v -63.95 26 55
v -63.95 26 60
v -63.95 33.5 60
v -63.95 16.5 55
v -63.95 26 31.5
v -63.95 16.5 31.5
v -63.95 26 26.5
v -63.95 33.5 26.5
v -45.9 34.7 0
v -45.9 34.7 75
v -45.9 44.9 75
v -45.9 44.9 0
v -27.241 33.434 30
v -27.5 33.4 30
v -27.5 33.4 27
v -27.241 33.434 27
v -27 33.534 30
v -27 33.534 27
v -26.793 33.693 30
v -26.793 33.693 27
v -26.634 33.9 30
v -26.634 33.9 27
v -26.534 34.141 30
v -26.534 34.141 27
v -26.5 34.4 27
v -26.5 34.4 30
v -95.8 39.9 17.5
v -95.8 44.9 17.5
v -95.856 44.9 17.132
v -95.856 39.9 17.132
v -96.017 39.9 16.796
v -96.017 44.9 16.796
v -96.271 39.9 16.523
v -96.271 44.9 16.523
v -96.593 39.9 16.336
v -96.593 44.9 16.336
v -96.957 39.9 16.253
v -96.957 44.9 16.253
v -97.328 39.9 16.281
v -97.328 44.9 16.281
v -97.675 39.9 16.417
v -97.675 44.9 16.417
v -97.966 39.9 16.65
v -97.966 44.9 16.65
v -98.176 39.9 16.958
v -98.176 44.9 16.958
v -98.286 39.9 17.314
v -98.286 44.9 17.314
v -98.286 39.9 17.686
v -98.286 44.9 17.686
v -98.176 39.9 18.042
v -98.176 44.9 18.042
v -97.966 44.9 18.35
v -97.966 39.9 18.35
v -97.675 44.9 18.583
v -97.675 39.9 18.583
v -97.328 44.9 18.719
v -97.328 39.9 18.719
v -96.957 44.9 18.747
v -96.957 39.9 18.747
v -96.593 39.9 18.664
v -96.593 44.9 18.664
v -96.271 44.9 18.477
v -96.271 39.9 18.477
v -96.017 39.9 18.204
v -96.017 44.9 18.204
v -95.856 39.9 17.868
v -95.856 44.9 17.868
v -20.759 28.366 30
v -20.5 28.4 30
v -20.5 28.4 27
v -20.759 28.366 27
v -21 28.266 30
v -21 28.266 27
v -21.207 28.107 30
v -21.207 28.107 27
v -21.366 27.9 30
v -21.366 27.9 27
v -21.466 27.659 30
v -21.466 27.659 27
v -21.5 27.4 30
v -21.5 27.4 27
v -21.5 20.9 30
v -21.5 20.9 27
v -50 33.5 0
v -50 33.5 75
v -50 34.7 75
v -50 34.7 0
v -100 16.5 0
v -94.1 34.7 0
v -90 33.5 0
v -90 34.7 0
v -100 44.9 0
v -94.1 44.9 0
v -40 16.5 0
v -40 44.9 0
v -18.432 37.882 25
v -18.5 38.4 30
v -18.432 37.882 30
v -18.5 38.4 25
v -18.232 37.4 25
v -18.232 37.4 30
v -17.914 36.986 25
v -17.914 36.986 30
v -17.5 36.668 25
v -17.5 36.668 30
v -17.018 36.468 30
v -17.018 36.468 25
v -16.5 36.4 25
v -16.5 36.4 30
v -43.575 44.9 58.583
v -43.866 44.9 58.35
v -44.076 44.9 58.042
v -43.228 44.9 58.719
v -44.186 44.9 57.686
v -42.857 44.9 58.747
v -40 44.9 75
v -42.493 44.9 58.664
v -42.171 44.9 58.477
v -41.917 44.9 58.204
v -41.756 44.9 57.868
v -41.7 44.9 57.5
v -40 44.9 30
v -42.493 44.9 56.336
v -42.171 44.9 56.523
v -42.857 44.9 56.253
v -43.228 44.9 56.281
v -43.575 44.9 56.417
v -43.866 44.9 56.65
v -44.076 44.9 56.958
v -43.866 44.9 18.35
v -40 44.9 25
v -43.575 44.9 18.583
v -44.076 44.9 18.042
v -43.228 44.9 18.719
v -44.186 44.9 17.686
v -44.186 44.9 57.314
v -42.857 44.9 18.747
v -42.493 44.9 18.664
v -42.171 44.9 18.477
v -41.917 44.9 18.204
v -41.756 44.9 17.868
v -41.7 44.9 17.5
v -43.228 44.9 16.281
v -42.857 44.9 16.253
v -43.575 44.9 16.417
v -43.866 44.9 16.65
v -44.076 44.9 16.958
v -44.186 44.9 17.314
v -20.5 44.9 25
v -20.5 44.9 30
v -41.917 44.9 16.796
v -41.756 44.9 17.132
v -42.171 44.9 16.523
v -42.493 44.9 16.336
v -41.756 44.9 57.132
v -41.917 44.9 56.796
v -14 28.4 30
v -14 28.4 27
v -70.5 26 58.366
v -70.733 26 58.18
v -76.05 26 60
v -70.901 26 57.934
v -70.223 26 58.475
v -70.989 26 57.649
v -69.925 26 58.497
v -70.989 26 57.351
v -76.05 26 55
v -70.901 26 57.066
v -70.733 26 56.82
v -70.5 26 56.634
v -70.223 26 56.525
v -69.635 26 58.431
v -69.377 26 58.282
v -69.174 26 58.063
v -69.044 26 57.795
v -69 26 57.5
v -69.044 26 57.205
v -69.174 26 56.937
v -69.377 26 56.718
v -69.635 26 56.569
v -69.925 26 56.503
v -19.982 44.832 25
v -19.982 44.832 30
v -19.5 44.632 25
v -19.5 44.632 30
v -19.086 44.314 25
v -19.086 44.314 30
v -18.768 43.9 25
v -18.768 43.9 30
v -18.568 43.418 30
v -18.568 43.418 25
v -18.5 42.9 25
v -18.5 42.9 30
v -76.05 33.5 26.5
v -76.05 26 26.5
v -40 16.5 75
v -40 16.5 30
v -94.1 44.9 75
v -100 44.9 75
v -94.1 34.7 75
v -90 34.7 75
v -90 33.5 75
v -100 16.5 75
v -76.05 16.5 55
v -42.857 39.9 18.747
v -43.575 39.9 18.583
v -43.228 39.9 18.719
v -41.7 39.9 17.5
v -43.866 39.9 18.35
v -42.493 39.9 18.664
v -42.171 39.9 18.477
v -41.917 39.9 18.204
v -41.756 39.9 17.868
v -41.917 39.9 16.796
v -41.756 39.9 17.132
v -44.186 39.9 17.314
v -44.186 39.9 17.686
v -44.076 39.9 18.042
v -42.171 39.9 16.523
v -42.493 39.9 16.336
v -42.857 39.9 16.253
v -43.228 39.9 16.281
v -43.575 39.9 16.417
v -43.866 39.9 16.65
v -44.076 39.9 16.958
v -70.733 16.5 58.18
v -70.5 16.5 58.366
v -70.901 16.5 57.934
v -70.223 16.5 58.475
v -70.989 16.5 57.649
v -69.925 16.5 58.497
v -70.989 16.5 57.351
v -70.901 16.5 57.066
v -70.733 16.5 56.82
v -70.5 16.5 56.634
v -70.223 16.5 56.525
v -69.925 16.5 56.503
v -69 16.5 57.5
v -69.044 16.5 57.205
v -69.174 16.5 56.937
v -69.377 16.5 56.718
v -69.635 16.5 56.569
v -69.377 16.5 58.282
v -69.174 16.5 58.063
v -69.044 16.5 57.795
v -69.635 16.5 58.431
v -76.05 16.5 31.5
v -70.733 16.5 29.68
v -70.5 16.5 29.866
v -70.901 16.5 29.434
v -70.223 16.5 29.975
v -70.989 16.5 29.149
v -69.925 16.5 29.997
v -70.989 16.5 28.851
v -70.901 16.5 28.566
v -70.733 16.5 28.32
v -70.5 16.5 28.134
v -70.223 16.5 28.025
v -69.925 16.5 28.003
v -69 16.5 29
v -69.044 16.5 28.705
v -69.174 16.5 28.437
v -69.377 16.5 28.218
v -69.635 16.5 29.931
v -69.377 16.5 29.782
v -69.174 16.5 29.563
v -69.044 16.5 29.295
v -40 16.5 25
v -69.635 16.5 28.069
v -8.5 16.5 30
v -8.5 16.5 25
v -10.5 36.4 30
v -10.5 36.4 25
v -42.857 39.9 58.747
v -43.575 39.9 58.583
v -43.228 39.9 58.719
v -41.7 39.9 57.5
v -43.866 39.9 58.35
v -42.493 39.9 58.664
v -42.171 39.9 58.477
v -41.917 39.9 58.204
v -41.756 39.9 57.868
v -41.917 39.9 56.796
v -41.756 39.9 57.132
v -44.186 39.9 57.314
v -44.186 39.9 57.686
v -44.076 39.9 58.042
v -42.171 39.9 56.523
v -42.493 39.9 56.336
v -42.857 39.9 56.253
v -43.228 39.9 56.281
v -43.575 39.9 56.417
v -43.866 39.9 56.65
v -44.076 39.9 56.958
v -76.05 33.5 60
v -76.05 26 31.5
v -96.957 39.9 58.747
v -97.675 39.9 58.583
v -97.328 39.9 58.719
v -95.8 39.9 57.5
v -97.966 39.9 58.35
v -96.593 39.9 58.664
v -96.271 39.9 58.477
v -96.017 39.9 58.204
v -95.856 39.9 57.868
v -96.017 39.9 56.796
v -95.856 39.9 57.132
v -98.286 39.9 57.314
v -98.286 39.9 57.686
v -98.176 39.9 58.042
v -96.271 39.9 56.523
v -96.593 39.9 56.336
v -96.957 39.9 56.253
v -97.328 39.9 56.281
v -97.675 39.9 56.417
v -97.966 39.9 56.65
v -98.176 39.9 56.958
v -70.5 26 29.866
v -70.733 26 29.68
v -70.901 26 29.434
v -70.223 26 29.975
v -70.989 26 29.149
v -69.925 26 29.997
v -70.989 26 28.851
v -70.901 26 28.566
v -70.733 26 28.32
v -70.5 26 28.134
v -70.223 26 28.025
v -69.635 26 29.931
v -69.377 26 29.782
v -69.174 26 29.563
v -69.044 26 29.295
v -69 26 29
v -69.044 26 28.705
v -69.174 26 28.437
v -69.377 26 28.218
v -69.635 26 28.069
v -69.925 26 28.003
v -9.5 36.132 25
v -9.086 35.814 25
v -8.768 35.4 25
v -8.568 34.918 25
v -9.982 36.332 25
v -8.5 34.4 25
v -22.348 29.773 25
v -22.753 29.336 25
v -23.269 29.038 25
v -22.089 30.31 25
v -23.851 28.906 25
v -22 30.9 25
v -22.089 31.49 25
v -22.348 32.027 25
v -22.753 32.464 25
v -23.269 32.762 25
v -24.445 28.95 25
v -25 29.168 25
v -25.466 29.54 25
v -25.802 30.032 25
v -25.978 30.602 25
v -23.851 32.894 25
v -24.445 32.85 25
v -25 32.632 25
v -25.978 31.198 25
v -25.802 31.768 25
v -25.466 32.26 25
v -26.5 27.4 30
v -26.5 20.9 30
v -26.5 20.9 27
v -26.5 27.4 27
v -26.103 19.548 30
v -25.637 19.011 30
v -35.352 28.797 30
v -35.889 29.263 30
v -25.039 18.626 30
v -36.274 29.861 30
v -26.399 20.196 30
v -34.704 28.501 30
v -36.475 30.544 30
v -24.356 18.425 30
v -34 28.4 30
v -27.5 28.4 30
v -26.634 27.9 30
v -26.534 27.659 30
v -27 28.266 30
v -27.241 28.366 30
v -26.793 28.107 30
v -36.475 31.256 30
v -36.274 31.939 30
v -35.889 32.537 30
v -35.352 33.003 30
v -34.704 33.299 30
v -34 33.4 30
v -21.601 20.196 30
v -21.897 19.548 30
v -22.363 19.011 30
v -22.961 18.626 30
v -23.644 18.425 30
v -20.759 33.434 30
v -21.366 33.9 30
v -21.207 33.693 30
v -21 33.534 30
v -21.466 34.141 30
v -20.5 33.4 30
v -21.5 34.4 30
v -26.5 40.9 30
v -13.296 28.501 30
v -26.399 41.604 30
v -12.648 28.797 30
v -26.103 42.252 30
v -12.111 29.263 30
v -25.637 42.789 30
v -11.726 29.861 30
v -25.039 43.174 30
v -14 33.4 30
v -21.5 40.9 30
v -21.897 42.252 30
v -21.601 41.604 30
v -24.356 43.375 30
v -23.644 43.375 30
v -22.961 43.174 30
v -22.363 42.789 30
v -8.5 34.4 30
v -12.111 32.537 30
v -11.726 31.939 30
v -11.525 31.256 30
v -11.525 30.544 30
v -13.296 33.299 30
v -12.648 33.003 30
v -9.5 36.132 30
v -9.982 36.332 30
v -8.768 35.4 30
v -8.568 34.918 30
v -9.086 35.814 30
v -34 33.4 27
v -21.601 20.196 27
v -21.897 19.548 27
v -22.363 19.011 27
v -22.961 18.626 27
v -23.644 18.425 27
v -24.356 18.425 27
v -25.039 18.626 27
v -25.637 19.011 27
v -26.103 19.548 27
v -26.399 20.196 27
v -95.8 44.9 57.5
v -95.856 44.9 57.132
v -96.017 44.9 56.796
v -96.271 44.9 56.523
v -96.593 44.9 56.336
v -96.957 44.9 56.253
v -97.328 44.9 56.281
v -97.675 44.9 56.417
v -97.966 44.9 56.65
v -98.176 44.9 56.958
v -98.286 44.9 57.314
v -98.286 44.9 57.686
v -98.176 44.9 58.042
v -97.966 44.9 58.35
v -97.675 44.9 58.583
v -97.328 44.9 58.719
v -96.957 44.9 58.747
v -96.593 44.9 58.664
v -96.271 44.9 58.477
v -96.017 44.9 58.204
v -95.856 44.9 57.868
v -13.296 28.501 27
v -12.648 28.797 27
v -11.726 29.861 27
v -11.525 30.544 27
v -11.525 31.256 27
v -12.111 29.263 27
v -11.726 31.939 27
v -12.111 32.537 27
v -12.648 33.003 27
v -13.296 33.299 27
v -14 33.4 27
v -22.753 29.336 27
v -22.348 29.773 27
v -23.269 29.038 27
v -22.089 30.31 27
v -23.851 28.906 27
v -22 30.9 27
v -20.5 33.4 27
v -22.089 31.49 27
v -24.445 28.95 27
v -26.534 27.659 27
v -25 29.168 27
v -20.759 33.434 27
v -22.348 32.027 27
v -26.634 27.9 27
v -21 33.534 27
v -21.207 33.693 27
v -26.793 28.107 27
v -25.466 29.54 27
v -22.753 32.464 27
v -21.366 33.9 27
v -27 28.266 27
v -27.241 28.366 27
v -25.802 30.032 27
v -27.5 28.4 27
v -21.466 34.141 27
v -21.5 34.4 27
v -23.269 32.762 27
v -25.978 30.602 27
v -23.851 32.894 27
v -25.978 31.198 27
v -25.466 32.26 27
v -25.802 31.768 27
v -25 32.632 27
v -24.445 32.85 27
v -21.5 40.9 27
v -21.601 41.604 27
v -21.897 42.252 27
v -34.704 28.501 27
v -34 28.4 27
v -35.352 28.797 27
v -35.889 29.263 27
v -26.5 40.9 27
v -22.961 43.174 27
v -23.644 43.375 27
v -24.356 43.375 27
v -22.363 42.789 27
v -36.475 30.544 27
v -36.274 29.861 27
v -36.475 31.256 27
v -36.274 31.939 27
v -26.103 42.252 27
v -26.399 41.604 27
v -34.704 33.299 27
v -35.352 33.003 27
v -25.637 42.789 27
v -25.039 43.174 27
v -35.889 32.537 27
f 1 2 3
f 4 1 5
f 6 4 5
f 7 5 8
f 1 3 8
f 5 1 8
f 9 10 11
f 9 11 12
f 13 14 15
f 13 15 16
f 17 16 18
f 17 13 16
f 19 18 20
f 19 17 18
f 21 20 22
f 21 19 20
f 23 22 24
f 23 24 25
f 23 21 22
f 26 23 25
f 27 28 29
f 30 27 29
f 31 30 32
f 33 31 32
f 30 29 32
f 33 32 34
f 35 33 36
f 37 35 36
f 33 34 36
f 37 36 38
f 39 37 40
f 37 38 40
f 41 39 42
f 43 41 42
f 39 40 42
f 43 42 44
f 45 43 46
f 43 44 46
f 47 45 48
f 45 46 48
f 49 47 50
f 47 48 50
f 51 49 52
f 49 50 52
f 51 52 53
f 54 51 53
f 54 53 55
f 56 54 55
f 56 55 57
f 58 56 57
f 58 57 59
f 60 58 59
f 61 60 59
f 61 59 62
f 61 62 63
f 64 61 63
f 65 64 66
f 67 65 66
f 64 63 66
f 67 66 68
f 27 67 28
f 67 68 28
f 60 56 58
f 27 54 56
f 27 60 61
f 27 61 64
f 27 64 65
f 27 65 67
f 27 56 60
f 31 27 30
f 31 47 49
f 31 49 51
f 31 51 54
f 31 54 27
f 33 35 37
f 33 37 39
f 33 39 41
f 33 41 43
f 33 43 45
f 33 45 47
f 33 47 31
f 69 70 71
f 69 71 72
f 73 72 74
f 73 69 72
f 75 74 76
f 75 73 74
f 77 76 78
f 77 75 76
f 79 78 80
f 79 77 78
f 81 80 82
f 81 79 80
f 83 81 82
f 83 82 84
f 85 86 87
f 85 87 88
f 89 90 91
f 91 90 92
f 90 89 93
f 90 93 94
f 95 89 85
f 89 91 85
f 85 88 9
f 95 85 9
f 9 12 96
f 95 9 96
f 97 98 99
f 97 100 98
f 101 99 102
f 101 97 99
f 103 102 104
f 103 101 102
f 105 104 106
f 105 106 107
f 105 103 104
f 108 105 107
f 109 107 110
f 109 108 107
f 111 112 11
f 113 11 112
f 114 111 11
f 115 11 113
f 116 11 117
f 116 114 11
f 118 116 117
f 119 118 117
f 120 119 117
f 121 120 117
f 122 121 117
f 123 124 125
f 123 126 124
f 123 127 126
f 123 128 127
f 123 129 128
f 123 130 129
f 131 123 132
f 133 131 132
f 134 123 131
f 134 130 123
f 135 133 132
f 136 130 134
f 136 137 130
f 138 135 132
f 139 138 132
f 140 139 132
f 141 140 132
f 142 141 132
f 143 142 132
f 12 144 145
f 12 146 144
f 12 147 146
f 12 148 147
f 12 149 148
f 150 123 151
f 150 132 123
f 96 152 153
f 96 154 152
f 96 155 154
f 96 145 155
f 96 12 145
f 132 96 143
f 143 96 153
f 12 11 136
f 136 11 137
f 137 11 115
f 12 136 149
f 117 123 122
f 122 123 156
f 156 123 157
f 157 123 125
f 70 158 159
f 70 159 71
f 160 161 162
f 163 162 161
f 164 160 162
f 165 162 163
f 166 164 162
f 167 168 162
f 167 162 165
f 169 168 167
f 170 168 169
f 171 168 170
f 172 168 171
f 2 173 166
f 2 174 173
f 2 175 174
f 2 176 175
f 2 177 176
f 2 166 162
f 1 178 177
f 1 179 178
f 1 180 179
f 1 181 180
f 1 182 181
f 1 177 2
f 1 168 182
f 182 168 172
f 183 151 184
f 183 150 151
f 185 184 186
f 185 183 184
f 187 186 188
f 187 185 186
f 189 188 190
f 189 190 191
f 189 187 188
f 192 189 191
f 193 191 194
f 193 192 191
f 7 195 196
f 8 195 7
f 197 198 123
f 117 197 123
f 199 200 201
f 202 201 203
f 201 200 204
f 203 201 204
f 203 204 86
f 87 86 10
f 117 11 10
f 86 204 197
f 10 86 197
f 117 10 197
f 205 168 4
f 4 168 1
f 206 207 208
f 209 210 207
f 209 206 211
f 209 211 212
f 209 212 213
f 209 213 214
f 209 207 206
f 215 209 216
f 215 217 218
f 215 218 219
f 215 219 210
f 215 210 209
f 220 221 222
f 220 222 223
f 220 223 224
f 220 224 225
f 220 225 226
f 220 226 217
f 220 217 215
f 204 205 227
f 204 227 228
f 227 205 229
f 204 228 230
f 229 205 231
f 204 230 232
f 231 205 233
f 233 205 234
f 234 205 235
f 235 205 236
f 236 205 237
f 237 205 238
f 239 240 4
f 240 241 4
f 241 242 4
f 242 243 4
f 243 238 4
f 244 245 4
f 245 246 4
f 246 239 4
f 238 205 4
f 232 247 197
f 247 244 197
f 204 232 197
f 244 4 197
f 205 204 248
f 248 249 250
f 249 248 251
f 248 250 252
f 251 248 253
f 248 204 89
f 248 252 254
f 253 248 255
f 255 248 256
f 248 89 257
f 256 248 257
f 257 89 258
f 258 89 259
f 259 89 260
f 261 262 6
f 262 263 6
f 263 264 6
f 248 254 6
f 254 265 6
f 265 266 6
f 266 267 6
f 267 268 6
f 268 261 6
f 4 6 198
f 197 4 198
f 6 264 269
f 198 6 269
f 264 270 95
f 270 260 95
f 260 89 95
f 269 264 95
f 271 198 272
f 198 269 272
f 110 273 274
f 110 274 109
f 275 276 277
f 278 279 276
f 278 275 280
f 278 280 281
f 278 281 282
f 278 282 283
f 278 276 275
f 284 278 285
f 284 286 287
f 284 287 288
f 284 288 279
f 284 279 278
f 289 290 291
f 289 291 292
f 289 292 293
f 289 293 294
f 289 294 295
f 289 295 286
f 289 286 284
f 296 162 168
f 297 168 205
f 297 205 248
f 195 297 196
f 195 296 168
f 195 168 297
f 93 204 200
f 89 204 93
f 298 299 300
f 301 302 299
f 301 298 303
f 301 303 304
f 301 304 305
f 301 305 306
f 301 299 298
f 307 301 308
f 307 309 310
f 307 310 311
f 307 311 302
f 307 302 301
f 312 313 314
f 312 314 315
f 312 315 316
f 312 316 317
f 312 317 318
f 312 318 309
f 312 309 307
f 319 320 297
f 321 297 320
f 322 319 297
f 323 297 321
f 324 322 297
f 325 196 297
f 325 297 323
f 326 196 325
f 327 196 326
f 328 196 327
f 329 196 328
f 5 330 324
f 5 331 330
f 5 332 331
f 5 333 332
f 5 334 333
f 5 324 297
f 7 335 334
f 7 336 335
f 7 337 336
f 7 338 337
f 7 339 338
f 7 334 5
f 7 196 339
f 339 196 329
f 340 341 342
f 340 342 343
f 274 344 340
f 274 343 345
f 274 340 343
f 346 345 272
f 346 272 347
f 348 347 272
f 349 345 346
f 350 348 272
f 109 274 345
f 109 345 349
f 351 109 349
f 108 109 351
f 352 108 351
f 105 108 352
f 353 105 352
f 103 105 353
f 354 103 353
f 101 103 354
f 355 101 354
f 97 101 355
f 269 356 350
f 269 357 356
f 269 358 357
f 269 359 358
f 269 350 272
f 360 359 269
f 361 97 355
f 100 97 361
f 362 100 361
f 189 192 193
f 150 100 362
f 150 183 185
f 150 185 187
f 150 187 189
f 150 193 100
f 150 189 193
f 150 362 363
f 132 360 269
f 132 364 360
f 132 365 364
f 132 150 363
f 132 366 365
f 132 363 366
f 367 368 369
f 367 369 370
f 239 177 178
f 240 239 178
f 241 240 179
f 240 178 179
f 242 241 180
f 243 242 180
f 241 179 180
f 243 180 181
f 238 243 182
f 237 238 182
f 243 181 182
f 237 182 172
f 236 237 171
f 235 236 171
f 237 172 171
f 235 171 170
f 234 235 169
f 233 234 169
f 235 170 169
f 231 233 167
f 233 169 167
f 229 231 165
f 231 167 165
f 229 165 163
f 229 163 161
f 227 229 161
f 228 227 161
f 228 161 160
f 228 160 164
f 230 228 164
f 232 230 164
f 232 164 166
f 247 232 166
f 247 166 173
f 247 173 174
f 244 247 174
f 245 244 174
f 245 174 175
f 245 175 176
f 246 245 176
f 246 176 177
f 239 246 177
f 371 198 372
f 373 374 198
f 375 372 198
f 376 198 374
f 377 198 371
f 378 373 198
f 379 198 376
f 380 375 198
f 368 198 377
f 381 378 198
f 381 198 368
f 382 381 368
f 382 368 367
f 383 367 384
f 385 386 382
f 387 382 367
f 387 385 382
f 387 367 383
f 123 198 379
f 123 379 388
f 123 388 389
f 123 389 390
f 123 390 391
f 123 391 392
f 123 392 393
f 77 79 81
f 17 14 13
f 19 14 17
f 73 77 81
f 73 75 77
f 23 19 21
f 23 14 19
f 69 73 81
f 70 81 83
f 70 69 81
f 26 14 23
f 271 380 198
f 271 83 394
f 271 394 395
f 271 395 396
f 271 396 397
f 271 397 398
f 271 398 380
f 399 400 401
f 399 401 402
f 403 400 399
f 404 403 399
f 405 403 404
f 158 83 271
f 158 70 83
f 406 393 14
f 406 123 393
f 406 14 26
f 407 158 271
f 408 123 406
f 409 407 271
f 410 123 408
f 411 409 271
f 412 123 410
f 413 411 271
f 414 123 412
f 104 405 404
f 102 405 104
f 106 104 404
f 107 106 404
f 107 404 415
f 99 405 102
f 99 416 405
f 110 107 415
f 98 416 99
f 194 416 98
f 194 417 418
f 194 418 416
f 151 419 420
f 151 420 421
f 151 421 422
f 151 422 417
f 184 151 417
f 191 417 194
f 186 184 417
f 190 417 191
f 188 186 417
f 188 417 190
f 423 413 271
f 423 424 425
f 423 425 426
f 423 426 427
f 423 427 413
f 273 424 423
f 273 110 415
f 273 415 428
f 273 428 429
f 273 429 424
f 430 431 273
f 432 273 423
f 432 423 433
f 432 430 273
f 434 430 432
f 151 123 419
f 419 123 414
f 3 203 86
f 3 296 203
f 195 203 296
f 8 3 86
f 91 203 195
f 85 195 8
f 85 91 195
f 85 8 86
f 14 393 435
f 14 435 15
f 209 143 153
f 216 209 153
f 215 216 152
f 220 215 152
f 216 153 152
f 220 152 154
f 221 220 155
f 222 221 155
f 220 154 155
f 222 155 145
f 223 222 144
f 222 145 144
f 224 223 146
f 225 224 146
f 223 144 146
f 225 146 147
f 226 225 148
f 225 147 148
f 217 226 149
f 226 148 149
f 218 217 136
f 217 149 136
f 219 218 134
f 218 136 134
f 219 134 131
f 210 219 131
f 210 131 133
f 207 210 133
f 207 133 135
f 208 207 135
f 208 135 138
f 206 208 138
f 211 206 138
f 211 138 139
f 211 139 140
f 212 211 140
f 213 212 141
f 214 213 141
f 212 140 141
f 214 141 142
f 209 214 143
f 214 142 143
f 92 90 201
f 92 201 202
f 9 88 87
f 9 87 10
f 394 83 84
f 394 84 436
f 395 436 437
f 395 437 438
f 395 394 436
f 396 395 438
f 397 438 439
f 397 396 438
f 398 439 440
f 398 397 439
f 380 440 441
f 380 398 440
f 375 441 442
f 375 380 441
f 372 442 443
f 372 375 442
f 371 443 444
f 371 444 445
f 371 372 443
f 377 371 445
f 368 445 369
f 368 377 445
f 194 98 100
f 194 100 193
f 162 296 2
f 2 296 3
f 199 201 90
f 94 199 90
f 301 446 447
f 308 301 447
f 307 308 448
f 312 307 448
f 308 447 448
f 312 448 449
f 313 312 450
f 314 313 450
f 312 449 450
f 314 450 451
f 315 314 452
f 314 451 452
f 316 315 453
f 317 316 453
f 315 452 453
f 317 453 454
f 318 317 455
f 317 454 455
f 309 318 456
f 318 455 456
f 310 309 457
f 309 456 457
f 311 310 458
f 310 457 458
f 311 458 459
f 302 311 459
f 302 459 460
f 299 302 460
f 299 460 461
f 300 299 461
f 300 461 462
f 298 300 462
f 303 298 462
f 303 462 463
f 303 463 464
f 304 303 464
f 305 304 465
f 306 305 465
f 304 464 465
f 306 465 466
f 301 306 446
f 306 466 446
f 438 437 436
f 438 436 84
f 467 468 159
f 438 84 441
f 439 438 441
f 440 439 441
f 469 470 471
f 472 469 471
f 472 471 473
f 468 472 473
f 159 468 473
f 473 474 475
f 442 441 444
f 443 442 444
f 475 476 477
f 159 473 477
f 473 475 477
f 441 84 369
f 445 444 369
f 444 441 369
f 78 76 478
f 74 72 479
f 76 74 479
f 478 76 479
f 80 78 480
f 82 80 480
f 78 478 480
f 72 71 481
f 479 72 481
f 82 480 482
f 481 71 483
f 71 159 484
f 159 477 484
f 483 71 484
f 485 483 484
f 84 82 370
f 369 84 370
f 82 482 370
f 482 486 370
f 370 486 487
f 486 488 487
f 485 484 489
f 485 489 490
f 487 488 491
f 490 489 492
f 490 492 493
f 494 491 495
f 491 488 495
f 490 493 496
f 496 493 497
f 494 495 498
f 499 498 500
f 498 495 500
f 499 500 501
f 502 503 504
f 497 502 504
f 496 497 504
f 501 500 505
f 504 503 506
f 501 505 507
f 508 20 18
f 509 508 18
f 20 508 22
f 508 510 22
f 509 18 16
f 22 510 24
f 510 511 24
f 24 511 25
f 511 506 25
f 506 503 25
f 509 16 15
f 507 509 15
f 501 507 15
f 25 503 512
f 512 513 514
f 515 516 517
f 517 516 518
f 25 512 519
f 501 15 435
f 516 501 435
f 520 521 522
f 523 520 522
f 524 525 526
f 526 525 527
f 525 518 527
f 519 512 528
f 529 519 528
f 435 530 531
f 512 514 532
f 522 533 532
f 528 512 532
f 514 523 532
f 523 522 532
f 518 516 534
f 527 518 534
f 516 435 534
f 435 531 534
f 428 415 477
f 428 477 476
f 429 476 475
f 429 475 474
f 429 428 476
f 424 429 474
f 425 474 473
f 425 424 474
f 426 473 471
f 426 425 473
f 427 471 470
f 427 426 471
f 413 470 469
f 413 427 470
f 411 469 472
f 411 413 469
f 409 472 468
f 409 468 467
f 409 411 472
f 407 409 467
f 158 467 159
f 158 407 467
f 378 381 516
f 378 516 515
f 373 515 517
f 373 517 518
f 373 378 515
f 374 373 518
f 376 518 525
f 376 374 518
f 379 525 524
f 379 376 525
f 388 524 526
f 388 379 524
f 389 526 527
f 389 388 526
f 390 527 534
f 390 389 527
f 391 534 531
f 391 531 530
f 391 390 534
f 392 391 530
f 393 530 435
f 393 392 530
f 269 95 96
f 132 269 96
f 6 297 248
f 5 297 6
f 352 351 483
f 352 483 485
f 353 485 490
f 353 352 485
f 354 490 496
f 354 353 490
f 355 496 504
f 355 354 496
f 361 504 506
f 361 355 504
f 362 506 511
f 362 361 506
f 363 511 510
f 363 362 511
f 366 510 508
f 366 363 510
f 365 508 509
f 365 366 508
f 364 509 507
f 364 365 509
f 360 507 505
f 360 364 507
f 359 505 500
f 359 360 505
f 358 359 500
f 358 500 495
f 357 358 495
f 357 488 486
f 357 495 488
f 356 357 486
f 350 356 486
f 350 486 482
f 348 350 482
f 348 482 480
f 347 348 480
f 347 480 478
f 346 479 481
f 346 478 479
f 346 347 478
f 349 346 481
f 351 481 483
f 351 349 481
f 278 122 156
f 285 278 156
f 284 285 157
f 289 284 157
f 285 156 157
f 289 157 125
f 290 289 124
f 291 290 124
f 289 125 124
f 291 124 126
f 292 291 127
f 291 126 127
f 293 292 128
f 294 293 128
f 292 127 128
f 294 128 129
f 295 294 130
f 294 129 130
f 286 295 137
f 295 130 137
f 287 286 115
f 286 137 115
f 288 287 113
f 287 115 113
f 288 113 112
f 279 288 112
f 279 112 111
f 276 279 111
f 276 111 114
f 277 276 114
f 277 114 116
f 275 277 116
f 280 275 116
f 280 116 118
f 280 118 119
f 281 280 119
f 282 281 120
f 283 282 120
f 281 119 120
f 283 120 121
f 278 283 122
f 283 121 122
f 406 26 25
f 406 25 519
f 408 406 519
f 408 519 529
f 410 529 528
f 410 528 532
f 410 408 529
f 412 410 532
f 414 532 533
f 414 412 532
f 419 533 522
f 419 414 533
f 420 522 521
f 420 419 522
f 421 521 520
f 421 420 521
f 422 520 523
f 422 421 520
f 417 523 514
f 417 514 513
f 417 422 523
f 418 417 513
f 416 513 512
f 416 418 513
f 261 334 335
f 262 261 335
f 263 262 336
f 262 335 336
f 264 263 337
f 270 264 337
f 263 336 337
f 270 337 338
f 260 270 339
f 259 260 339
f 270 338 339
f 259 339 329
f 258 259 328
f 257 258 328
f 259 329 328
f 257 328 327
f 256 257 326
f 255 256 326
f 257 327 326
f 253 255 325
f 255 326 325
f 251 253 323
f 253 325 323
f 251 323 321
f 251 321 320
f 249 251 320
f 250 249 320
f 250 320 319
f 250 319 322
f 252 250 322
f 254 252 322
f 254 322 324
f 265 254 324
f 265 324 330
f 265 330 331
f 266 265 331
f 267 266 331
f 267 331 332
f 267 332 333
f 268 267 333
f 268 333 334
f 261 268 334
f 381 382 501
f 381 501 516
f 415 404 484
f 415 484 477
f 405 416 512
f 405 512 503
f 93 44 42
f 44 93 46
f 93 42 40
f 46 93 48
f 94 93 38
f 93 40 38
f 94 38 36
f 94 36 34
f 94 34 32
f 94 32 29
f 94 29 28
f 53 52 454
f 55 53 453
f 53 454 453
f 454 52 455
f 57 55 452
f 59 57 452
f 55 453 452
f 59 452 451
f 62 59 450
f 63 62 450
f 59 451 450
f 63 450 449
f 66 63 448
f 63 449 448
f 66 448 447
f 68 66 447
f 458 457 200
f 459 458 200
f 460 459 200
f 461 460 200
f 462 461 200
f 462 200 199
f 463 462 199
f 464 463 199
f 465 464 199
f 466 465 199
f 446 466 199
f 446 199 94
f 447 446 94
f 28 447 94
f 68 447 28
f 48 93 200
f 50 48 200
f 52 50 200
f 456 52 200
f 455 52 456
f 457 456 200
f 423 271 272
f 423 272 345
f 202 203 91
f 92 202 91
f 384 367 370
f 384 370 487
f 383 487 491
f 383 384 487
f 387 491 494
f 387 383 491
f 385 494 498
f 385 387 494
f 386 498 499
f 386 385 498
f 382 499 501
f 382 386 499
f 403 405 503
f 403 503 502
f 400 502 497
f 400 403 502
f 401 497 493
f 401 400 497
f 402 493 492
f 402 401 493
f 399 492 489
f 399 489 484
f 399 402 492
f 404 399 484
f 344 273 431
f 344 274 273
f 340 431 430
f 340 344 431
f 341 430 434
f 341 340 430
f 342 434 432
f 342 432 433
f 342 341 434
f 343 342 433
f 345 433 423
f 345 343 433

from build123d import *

# Parameters (mm, degrees)
SKIZZE1_W                            = 100
SKIZZE1_H                            = 50
AUFSATZ_LINEAR_AUSTRAGEN1_DEPTH      = 10
SERVOLOCH_R                          = 5
SCHNITT_LINEAR_AUSTRAGEN2_DEPTH      = 11
BREITE_W                             = 60
BREITE_H                             = 17
AUFSATZ_LINEAR_AUSTRAGEN2_DEPTH      = 65
SERVO_W                              = 12.1
SERVO_H                              = 23.5
SERVO_R                              = 1.9
SERVO_R_2                            = 1
SCHNITT_LINEAR_AUSTRAGEN3_DEPTH      = 60
F_1_2MM_SCHIENE_W                    = 10
F_1_2MM_SCHIENE_H                    = 65
AUFSATZ_LINEAR_AUSTRAGEN3_DEPTH      = 1.2
SERVOTIEFER_LEGEN_W                  = 12.1
SERVOTIEFER_LEGEN_H                  = 5
SCHNITT_LINEAR_AUSTRAGEN4_DEPTH      = 7.5
F_10_2MM_SCHIENE_W                   = 5.9
F_10_2MM_SCHIENE_H                   = 65
AUFSATZ_LINEAR_AUSTRAGEN4_DEPTH      = 10.2
SCHNITT_LINEAR_AUSTRAGEN5_DEPTH      = 11
SKIZZE11_W                           = 40
SKIZZE11_H                           = 50
SKIZZE11_R                           = 2
AUFSATZ_LINEAR_AUSTRAGEN5_DEPTH      = 20
SKIZZE12_W                           = 40
SKIZZE12_H                           = 50
SCHNITT_LINEAR_AUSTRAGEN6_DEPTH      = 25
SCHNITT_LINEAR_AUSTRAGEN8_DEPTH      = 3
SCHNITT_LINEAR_AUSTRAGEN9_DEPTH      = 46
SCHNITT_LINEAR_AUSTRAGEN9_DEPTH_BACK = 30
VERRUNDUNG5_R                        = 2
VERRUNDUNG6_R                        = 2
VERRUNDUNG7_R                        = 2
SKIZZE14_R                           = 1.25
SCHNITT_LINEAR_AUSTRAGEN10_DEPTH     = 5


with BuildPart() as part:
    # Skizze1 → Aufsatz-Linear austragen1 (new body)
    with BuildSketch(Plane.XY):
        with Locations((-50, 25)):
            Rectangle(SKIZZE1_W, SKIZZE1_H)
    extrude(amount=AUFSATZ_LINEAR_AUSTRAGEN1_DEPTH)

    # ServoLoch → Schnitt-Linear austragen2 (cut, through all)
    with BuildSketch(Plane.XY.offset(10)):
        with Locations((-22.5, 25)):
            Circle(SERVOLOCH_R)
    extrude(amount=-SCHNITT_LINEAR_AUSTRAGEN2_DEPTH, mode=Mode.SUBTRACT)

    # Breite → Aufsatz-Linear austragen2 (add)
    with BuildSketch(Plane.XY.offset(10)):
        with Locations((-70, 25)):
            Rectangle(BREITE_W, BREITE_H)
    extrude(amount=AUFSATZ_LINEAR_AUSTRAGEN2_DEPTH)

    # Servo → Schnitt-Linear austragen3 (cut)
    with BuildSketch(Plane(origin=(0, 33.5, 0), x_dir=(1, 0, 0), z_dir=(0, 1, 0))):
        with Locations((-70, -43.25)):
            Rectangle(SERVO_W, SERVO_H)
        with Locations((-70, -37.5)):
            Circle(SERVO_R, mode=Mode.SUBTRACT)
        with Locations((-70, -37.5)):
            Circle(SERVO_R)
        with Locations((-70, -29)):
            Circle(SERVO_R_2)
        with Locations((-70, -57.5)):
            Circle(SERVO_R_2)
    extrude(amount=-SCHNITT_LINEAR_AUSTRAGEN3_DEPTH, mode=Mode.SUBTRACT)

    # 1,2mm Schiene → Aufsatz-Linear austragen3 (add)
    with BuildSketch(Plane(origin=(0, 33.5, 0), x_dir=(1, 0, 0), z_dir=(0, 1, 0))):
        with Locations((-95, -42.5)):
            Rectangle(F_1_2MM_SCHIENE_W, F_1_2MM_SCHIENE_H)
        with Locations((-45, -42.5)):
            Rectangle(F_1_2MM_SCHIENE_W, F_1_2MM_SCHIENE_H)
    extrude(amount=AUFSATZ_LINEAR_AUSTRAGEN3_DEPTH)

    # ServoTiefer legen → Schnitt-Linear austragen4 (cut)
    with BuildSketch(Plane(origin=(0, 33.5, 0), x_dir=(1, 0, 0), z_dir=(0, 1, 0))):
        with Locations((-70, -29)):
            Rectangle(SERVOTIEFER_LEGEN_W, SERVOTIEFER_LEGEN_H)
        with Locations((-70, -57.5)):
            Rectangle(SERVOTIEFER_LEGEN_W, SERVOTIEFER_LEGEN_H)
    extrude(amount=-SCHNITT_LINEAR_AUSTRAGEN4_DEPTH, mode=Mode.SUBTRACT)

    # 10,2mm Schiene → Aufsatz-Linear austragen4 (add)
    with BuildSketch(Plane(origin=(0, 34.7, 0), x_dir=(1, 0, 0), z_dir=(0, 1, 0))):
        with Locations((-97.05, -42.5)):
            Rectangle(F_10_2MM_SCHIENE_W, F_10_2MM_SCHIENE_H)
        with Locations((-42.95, -42.5)):
            Rectangle(F_10_2MM_SCHIENE_W, F_10_2MM_SCHIENE_H)
    extrude(amount=AUFSATZ_LINEAR_AUSTRAGEN4_DEPTH)

    # Skizze10 → Schnitt-Linear austragen5 (cut, through all)
    with BuildSketch(Plane.XY.offset(10)):
        Polygon((-100, 44.9), (-94.1, 44.9), (-94.1, 34.7), (-90, 34.7), (-90, 33.5), (-50, 33.5), (-50, 34.7), (-45.9, 34.7), (-45.9, 44.9), (-40, 44.9), (-40, 52.602302565), (-100, 52.602302565), align=None)
    extrude(amount=-SCHNITT_LINEAR_AUSTRAGEN5_DEPTH, mode=Mode.SUBTRACT)

    # Skizze11 → Aufsatz-Linear austragen5 (add)
    with BuildSketch(Plane.XY.offset(10)):
        with Locations((-20, 25)):
            Rectangle(SKIZZE11_W, SKIZZE11_H)
        with Locations((-24, 30.9)):
            Circle(SKIZZE11_R, mode=Mode.SUBTRACT)
    extrude(amount=AUFSATZ_LINEAR_AUSTRAGEN5_DEPTH)

    # Skizze12 → Schnitt-Linear austragen6 (cut)
    with BuildSketch(Plane(origin=(0, 0, 0), x_dir=(-1, 0, 0), z_dir=(0, 0, -1))):
        with Locations((20, 25)):
            Rectangle(SKIZZE12_W, SKIZZE12_H)
    extrude(amount=-SCHNITT_LINEAR_AUSTRAGEN6_DEPTH, mode=Mode.SUBTRACT)

    # Skizze15 → Schnitt-Linear austragen8 (cut)
    with BuildSketch(Plane.XY.offset(30)):
        with BuildLine():
            Line((-21.5, 40.9), (-21.5, 34.4))
            ThreePointArc((-21.5, 34.4), (-21.207106781, 33.692893219), (-20.5, 33.4))
            Line((-20.5, 33.4), (-14, 33.4))
            ThreePointArc((-14, 33.4), (-11.5, 30.9), (-14, 28.4))
            Line((-14, 28.4), (-20.5, 28.4))
            ThreePointArc((-20.5, 28.4), (-21.207106781, 28.107106781), (-21.5, 27.4))
            Line((-21.5, 27.4), (-21.5, 20.9))
            ThreePointArc((-21.5, 20.9), (-24, 18.4), (-26.5, 20.9))
            Line((-26.5, 20.9), (-26.5, 27.4))
            ThreePointArc((-26.5, 27.4), (-26.792893219, 28.107106781), (-27.5, 28.4))
            Line((-27.5, 28.4), (-34, 28.4))
            ThreePointArc((-34, 28.4), (-36.5, 30.9), (-34, 33.4))
            Line((-34, 33.4), (-27.5, 33.4))
            ThreePointArc((-27.5, 33.4), (-26.792893219, 33.692893219), (-26.5, 34.4))
            Line((-26.5, 34.4), (-26.5, 40.9))
            ThreePointArc((-26.5, 40.9), (-24, 43.4), (-21.5, 40.9))
        make_face()
    extrude(amount=-SCHNITT_LINEAR_AUSTRAGEN8_DEPTH, mode=Mode.SUBTRACT)

    # Skizze18 → Schnitt-Linear austragen9 (cut, two sides)
    with BuildSketch(Plane.XY.offset(30)) as schnitt_linear_austragen9_sk:
        Polygon((0, 0), (-100, 0), (-100, 16.5), (-8.5, 16.5), (-8.5, 36.4), (-18.5, 36.4), (-18.5, 44.9), (-40, 44.9), (-40, 50), (0, 50), align=None)
    extrude(amount=SCHNITT_LINEAR_AUSTRAGEN9_DEPTH, mode=Mode.SUBTRACT)
    extrude(schnitt_linear_austragen9_sk.sketch, amount=-SCHNITT_LINEAR_AUSTRAGEN9_DEPTH_BACK, mode=Mode.SUBTRACT)

    # Verrundung5
    verrundung5_edges = [part.edges().sort_by_distance(p)[0] for p in [
        (-18.5, 44.9, 27.5),
    ]]
    fillet(verrundung5_edges, radius=VERRUNDUNG5_R)

    # Verrundung6
    verrundung6_edges = [part.edges().sort_by_distance(p)[0] for p in [
        (-18.5, 36.4, 27.5),
    ]]
    fillet(verrundung6_edges, radius=VERRUNDUNG6_R)

    # Verrundung7
    verrundung7_edges = [part.edges().sort_by_distance(p)[0] for p in [
        (-8.5, 36.4, 27.5),
    ]]
    fillet(verrundung7_edges, radius=VERRUNDUNG7_R)

    # Skizze14 → Schnitt-Linear austragen10 (cut)
    with BuildSketch(Plane(origin=(0, 44.9, 0), x_dir=(1, 0, 0), z_dir=(0, 1, 0))):
        with Locations((-97.05, -57.5)):
            Circle(SKIZZE14_R)
        with Locations((-42.95, -57.5)):
            Circle(SKIZZE14_R)
        with Locations((-42.95, -17.5)):
            Circle(SKIZZE14_R)
        with Locations((-97.05, -17.5)):
            Circle(SKIZZE14_R)
    extrude(amount=-SCHNITT_LINEAR_AUSTRAGEN10_DEPTH, mode=Mode.SUBTRACT)


solid = part.part
